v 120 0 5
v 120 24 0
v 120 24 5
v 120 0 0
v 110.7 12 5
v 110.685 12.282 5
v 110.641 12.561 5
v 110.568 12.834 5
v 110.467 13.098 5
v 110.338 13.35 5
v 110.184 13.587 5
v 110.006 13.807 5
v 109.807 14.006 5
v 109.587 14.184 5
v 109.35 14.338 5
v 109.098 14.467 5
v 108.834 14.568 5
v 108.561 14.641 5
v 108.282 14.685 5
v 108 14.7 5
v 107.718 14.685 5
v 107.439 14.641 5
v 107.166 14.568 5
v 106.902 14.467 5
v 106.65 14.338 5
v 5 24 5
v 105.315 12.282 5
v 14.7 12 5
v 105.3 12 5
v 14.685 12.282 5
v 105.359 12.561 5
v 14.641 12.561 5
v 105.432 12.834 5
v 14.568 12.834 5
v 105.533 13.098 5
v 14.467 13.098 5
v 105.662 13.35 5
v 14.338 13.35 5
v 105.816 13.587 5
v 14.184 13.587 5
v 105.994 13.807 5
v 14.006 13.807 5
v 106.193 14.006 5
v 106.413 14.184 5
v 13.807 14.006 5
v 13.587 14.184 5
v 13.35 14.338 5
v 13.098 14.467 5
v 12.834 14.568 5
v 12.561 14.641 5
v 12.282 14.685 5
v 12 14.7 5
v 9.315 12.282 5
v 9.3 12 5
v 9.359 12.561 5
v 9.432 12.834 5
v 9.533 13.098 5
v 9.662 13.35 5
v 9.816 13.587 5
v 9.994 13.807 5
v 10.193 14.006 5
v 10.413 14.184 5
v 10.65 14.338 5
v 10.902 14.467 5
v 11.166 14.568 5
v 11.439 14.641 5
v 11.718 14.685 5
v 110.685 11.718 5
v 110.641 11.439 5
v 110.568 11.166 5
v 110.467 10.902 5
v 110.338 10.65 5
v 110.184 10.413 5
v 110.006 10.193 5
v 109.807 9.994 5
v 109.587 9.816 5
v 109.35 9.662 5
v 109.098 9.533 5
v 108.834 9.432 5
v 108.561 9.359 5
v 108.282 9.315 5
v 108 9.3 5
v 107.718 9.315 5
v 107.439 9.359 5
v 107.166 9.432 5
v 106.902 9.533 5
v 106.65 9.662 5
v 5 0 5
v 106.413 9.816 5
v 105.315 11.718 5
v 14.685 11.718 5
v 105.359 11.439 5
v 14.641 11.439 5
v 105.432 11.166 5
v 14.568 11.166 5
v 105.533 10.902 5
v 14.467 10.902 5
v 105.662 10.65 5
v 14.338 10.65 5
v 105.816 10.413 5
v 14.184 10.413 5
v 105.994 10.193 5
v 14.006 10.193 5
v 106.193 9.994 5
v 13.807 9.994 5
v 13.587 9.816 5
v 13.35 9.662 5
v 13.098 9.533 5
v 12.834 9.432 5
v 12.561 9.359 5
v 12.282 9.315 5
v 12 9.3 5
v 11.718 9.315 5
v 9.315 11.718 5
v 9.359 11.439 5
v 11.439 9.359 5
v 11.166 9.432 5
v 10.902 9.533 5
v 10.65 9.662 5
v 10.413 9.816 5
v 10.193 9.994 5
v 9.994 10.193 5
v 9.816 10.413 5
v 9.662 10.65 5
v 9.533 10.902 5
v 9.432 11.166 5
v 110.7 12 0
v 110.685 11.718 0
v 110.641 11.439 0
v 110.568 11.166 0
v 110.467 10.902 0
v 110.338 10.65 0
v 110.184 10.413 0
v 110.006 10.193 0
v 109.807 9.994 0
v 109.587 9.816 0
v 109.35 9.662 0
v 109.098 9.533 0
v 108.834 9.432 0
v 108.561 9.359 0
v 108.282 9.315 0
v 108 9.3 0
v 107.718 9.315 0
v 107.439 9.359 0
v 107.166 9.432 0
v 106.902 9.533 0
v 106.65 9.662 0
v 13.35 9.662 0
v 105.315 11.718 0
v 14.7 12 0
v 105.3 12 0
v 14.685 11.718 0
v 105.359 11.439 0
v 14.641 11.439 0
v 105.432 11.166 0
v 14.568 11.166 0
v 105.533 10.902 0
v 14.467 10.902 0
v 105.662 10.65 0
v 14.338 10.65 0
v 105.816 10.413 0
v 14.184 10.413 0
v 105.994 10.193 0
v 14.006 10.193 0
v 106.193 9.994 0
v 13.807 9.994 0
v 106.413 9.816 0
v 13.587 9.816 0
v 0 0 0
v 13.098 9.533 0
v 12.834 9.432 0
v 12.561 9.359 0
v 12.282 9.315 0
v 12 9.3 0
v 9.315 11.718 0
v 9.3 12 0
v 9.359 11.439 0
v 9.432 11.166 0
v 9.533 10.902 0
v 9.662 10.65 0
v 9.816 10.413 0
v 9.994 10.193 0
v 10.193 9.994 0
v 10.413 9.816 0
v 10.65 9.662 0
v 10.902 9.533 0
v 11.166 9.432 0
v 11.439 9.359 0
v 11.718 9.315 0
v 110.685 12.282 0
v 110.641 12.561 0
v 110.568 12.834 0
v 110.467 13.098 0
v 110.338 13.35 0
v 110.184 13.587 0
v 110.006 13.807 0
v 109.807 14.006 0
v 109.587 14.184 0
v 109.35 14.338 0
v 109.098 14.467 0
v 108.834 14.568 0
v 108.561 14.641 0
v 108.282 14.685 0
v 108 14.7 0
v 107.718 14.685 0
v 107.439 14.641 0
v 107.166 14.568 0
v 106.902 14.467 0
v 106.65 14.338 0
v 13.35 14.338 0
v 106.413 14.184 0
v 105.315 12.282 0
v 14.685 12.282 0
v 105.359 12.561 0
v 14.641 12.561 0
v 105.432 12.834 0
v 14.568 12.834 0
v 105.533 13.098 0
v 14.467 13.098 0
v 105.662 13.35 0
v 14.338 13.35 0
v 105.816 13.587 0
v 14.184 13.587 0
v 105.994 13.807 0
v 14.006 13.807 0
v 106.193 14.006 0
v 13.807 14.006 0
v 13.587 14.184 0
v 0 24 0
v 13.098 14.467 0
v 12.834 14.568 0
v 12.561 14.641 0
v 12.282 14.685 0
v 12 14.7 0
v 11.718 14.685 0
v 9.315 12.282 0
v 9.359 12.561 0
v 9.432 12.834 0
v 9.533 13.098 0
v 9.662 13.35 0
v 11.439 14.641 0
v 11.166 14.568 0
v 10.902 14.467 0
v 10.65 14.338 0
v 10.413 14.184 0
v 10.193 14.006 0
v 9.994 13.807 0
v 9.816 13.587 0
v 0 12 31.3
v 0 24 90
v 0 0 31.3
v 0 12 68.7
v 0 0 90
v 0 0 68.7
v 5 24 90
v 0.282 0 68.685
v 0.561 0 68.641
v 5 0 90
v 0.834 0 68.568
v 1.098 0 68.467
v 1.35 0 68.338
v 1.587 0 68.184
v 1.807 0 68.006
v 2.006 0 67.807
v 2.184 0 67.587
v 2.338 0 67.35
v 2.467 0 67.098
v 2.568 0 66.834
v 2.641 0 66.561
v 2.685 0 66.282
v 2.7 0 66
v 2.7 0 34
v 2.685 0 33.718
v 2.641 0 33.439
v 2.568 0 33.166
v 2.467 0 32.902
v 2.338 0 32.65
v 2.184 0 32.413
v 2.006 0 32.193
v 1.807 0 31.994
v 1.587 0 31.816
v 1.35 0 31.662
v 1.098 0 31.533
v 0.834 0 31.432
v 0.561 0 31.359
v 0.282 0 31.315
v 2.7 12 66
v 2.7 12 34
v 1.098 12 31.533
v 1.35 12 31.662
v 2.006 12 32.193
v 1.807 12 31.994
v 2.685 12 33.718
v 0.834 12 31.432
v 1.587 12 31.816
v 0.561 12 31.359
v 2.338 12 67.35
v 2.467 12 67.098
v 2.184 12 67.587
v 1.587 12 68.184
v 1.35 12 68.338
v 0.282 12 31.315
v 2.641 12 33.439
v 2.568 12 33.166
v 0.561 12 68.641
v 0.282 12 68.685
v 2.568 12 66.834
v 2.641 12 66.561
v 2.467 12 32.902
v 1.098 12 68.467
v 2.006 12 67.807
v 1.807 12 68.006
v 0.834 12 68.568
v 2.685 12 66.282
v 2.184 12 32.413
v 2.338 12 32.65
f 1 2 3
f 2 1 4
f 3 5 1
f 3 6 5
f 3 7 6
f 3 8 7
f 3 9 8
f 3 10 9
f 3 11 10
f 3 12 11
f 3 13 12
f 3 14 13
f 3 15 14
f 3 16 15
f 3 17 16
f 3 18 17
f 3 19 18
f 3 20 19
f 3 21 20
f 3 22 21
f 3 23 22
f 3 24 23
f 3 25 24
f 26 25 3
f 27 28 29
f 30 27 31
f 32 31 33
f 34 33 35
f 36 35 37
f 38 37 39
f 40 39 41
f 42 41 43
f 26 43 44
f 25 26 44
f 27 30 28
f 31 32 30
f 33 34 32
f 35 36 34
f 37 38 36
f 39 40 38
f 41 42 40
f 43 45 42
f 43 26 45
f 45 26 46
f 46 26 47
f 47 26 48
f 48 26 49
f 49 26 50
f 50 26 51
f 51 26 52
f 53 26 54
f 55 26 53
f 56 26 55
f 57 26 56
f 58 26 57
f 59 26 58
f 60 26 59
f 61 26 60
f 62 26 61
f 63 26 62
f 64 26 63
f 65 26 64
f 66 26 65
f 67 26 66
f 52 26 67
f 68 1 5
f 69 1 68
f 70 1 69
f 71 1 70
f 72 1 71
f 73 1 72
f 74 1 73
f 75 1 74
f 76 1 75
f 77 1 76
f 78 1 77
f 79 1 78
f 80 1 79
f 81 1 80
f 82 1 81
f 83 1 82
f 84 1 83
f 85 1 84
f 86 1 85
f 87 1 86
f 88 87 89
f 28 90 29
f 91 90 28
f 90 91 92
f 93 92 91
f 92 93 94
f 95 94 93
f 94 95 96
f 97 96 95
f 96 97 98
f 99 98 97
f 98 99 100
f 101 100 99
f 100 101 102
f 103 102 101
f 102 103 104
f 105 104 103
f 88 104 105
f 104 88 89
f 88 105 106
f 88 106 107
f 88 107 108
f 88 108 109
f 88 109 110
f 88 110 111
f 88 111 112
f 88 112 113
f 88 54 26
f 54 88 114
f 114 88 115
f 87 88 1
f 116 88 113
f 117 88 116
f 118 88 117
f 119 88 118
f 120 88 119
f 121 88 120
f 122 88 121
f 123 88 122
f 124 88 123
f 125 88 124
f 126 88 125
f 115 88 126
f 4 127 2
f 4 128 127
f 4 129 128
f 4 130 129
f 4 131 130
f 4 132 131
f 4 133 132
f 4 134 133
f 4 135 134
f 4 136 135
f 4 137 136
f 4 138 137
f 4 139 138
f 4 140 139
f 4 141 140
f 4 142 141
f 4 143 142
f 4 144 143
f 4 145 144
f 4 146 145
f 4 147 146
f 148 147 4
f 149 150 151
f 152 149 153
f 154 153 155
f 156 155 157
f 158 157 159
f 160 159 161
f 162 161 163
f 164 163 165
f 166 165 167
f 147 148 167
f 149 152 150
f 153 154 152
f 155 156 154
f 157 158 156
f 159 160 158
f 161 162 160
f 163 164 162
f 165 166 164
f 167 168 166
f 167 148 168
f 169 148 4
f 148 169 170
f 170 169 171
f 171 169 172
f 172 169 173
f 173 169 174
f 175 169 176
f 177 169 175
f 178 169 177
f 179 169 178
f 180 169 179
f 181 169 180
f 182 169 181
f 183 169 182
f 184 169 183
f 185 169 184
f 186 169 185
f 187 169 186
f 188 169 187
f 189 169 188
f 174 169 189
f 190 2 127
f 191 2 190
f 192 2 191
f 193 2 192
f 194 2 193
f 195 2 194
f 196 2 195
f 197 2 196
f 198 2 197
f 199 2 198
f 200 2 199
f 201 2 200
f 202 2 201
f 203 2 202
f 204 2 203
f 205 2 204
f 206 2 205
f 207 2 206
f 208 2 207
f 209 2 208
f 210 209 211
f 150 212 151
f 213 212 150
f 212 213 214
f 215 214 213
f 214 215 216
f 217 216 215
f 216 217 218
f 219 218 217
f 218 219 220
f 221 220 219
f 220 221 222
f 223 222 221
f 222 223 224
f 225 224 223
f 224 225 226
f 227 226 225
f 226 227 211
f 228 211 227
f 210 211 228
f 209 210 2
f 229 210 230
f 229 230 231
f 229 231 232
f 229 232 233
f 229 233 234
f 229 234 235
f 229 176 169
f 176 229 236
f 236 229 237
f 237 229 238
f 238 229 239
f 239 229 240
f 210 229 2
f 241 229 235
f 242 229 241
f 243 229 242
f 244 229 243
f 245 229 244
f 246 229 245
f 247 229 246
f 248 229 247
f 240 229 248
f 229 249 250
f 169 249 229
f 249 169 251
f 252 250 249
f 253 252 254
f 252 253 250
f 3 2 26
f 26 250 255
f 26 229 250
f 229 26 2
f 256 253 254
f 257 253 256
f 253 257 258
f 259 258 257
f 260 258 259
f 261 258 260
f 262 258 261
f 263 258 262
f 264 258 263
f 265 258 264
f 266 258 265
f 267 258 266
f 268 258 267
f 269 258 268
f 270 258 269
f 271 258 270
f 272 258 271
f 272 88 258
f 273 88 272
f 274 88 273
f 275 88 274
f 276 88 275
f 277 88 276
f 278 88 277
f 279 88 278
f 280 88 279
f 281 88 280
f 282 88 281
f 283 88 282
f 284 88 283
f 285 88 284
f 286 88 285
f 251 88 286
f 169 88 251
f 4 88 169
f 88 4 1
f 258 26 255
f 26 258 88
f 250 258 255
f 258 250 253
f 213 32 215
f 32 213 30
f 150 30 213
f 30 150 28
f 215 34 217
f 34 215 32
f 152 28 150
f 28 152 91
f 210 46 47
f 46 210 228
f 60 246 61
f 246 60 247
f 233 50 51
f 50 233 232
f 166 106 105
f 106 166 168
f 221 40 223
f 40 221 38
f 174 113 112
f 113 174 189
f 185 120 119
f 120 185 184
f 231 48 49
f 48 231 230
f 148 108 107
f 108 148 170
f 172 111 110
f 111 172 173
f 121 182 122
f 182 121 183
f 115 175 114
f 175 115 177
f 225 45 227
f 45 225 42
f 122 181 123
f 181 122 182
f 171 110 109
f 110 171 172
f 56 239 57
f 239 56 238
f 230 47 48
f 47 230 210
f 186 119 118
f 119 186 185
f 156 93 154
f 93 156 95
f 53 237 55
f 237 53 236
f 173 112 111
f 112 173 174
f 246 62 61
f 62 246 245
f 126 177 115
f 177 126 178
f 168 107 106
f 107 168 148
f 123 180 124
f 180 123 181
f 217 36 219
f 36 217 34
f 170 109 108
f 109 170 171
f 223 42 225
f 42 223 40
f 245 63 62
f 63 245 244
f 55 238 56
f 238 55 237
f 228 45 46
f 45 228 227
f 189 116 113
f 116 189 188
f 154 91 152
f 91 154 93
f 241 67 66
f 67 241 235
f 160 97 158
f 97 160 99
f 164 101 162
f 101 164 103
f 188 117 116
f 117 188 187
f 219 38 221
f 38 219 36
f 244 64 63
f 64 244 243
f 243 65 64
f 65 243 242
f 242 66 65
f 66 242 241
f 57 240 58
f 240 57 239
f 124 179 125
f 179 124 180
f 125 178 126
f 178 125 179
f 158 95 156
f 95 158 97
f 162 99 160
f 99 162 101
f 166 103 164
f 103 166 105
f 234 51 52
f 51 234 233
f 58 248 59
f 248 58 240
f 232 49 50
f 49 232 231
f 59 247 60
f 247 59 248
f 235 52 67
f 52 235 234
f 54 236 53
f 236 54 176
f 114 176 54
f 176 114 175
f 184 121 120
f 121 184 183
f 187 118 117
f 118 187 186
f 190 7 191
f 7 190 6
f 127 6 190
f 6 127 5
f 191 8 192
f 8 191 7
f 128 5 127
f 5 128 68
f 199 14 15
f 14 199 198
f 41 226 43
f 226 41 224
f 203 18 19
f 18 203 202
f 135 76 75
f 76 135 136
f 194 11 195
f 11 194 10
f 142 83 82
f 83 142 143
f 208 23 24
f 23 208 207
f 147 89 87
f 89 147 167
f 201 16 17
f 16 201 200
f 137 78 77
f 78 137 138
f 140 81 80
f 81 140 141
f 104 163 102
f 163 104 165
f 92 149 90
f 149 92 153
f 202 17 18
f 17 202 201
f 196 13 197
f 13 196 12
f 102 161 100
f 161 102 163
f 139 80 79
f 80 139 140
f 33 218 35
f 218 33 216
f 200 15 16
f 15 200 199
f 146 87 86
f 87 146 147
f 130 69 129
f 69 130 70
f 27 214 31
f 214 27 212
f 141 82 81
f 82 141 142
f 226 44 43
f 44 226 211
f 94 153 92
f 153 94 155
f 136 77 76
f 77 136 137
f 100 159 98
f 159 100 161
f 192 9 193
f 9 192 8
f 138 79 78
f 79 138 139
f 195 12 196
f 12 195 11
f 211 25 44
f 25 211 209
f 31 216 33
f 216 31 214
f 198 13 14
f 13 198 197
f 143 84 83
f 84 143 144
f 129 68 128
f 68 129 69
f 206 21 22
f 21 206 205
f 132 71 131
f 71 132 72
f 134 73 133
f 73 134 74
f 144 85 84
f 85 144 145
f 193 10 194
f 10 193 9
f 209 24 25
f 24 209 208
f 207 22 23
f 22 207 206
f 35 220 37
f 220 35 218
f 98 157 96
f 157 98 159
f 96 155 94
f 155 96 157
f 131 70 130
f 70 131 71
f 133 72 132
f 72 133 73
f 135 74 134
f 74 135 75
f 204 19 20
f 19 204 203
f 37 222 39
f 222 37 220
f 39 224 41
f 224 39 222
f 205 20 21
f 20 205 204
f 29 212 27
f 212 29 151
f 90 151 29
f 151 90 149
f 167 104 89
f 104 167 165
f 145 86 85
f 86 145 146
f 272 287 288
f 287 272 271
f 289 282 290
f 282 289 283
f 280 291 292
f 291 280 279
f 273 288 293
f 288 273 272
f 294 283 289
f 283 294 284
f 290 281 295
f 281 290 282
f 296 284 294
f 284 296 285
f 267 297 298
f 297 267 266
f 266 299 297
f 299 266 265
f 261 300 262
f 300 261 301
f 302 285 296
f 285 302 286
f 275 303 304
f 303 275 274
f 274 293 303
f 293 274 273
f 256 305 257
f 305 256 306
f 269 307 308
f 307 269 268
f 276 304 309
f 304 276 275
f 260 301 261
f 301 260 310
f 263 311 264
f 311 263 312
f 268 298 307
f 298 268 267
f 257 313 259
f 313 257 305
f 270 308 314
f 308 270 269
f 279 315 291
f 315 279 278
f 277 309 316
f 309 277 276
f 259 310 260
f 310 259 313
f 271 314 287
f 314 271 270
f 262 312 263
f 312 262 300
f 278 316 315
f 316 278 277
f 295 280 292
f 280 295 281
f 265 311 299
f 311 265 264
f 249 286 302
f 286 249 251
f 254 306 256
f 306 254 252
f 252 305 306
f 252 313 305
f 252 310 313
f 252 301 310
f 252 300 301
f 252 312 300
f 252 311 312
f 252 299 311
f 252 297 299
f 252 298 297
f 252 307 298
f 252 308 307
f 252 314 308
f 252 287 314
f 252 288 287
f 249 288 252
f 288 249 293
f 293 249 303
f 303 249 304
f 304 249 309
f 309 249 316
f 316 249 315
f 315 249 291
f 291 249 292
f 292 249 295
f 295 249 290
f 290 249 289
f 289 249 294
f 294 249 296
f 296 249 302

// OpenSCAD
// Adjustable L bracket with upright slot.
$fn = 60;
eps = 0.02;
base_l = 120;
upright_h = 90;
width = 24;
thickness = 5;
slot_l = 32;
module vertical_slot() { hull() { translate([0,width/2,thickness+upright_h/2-slot_l/2]) rotate([90,0,0]) cylinder(d=5.4,h=width+2*eps); translate([0,width/2,thickness+upright_h/2+slot_l/2]) rotate([90,0,0]) cylinder(d=5.4,h=width+2*eps); } }
difference() {
    union() { cube([base_l,width,thickness]); cube([thickness,width,upright_h]); }
    for(x=[12,base_l-12]) translate([x,width/2,-eps]) cylinder(d=5.4,h=thickness+2*eps);
    vertical_slot();
}
